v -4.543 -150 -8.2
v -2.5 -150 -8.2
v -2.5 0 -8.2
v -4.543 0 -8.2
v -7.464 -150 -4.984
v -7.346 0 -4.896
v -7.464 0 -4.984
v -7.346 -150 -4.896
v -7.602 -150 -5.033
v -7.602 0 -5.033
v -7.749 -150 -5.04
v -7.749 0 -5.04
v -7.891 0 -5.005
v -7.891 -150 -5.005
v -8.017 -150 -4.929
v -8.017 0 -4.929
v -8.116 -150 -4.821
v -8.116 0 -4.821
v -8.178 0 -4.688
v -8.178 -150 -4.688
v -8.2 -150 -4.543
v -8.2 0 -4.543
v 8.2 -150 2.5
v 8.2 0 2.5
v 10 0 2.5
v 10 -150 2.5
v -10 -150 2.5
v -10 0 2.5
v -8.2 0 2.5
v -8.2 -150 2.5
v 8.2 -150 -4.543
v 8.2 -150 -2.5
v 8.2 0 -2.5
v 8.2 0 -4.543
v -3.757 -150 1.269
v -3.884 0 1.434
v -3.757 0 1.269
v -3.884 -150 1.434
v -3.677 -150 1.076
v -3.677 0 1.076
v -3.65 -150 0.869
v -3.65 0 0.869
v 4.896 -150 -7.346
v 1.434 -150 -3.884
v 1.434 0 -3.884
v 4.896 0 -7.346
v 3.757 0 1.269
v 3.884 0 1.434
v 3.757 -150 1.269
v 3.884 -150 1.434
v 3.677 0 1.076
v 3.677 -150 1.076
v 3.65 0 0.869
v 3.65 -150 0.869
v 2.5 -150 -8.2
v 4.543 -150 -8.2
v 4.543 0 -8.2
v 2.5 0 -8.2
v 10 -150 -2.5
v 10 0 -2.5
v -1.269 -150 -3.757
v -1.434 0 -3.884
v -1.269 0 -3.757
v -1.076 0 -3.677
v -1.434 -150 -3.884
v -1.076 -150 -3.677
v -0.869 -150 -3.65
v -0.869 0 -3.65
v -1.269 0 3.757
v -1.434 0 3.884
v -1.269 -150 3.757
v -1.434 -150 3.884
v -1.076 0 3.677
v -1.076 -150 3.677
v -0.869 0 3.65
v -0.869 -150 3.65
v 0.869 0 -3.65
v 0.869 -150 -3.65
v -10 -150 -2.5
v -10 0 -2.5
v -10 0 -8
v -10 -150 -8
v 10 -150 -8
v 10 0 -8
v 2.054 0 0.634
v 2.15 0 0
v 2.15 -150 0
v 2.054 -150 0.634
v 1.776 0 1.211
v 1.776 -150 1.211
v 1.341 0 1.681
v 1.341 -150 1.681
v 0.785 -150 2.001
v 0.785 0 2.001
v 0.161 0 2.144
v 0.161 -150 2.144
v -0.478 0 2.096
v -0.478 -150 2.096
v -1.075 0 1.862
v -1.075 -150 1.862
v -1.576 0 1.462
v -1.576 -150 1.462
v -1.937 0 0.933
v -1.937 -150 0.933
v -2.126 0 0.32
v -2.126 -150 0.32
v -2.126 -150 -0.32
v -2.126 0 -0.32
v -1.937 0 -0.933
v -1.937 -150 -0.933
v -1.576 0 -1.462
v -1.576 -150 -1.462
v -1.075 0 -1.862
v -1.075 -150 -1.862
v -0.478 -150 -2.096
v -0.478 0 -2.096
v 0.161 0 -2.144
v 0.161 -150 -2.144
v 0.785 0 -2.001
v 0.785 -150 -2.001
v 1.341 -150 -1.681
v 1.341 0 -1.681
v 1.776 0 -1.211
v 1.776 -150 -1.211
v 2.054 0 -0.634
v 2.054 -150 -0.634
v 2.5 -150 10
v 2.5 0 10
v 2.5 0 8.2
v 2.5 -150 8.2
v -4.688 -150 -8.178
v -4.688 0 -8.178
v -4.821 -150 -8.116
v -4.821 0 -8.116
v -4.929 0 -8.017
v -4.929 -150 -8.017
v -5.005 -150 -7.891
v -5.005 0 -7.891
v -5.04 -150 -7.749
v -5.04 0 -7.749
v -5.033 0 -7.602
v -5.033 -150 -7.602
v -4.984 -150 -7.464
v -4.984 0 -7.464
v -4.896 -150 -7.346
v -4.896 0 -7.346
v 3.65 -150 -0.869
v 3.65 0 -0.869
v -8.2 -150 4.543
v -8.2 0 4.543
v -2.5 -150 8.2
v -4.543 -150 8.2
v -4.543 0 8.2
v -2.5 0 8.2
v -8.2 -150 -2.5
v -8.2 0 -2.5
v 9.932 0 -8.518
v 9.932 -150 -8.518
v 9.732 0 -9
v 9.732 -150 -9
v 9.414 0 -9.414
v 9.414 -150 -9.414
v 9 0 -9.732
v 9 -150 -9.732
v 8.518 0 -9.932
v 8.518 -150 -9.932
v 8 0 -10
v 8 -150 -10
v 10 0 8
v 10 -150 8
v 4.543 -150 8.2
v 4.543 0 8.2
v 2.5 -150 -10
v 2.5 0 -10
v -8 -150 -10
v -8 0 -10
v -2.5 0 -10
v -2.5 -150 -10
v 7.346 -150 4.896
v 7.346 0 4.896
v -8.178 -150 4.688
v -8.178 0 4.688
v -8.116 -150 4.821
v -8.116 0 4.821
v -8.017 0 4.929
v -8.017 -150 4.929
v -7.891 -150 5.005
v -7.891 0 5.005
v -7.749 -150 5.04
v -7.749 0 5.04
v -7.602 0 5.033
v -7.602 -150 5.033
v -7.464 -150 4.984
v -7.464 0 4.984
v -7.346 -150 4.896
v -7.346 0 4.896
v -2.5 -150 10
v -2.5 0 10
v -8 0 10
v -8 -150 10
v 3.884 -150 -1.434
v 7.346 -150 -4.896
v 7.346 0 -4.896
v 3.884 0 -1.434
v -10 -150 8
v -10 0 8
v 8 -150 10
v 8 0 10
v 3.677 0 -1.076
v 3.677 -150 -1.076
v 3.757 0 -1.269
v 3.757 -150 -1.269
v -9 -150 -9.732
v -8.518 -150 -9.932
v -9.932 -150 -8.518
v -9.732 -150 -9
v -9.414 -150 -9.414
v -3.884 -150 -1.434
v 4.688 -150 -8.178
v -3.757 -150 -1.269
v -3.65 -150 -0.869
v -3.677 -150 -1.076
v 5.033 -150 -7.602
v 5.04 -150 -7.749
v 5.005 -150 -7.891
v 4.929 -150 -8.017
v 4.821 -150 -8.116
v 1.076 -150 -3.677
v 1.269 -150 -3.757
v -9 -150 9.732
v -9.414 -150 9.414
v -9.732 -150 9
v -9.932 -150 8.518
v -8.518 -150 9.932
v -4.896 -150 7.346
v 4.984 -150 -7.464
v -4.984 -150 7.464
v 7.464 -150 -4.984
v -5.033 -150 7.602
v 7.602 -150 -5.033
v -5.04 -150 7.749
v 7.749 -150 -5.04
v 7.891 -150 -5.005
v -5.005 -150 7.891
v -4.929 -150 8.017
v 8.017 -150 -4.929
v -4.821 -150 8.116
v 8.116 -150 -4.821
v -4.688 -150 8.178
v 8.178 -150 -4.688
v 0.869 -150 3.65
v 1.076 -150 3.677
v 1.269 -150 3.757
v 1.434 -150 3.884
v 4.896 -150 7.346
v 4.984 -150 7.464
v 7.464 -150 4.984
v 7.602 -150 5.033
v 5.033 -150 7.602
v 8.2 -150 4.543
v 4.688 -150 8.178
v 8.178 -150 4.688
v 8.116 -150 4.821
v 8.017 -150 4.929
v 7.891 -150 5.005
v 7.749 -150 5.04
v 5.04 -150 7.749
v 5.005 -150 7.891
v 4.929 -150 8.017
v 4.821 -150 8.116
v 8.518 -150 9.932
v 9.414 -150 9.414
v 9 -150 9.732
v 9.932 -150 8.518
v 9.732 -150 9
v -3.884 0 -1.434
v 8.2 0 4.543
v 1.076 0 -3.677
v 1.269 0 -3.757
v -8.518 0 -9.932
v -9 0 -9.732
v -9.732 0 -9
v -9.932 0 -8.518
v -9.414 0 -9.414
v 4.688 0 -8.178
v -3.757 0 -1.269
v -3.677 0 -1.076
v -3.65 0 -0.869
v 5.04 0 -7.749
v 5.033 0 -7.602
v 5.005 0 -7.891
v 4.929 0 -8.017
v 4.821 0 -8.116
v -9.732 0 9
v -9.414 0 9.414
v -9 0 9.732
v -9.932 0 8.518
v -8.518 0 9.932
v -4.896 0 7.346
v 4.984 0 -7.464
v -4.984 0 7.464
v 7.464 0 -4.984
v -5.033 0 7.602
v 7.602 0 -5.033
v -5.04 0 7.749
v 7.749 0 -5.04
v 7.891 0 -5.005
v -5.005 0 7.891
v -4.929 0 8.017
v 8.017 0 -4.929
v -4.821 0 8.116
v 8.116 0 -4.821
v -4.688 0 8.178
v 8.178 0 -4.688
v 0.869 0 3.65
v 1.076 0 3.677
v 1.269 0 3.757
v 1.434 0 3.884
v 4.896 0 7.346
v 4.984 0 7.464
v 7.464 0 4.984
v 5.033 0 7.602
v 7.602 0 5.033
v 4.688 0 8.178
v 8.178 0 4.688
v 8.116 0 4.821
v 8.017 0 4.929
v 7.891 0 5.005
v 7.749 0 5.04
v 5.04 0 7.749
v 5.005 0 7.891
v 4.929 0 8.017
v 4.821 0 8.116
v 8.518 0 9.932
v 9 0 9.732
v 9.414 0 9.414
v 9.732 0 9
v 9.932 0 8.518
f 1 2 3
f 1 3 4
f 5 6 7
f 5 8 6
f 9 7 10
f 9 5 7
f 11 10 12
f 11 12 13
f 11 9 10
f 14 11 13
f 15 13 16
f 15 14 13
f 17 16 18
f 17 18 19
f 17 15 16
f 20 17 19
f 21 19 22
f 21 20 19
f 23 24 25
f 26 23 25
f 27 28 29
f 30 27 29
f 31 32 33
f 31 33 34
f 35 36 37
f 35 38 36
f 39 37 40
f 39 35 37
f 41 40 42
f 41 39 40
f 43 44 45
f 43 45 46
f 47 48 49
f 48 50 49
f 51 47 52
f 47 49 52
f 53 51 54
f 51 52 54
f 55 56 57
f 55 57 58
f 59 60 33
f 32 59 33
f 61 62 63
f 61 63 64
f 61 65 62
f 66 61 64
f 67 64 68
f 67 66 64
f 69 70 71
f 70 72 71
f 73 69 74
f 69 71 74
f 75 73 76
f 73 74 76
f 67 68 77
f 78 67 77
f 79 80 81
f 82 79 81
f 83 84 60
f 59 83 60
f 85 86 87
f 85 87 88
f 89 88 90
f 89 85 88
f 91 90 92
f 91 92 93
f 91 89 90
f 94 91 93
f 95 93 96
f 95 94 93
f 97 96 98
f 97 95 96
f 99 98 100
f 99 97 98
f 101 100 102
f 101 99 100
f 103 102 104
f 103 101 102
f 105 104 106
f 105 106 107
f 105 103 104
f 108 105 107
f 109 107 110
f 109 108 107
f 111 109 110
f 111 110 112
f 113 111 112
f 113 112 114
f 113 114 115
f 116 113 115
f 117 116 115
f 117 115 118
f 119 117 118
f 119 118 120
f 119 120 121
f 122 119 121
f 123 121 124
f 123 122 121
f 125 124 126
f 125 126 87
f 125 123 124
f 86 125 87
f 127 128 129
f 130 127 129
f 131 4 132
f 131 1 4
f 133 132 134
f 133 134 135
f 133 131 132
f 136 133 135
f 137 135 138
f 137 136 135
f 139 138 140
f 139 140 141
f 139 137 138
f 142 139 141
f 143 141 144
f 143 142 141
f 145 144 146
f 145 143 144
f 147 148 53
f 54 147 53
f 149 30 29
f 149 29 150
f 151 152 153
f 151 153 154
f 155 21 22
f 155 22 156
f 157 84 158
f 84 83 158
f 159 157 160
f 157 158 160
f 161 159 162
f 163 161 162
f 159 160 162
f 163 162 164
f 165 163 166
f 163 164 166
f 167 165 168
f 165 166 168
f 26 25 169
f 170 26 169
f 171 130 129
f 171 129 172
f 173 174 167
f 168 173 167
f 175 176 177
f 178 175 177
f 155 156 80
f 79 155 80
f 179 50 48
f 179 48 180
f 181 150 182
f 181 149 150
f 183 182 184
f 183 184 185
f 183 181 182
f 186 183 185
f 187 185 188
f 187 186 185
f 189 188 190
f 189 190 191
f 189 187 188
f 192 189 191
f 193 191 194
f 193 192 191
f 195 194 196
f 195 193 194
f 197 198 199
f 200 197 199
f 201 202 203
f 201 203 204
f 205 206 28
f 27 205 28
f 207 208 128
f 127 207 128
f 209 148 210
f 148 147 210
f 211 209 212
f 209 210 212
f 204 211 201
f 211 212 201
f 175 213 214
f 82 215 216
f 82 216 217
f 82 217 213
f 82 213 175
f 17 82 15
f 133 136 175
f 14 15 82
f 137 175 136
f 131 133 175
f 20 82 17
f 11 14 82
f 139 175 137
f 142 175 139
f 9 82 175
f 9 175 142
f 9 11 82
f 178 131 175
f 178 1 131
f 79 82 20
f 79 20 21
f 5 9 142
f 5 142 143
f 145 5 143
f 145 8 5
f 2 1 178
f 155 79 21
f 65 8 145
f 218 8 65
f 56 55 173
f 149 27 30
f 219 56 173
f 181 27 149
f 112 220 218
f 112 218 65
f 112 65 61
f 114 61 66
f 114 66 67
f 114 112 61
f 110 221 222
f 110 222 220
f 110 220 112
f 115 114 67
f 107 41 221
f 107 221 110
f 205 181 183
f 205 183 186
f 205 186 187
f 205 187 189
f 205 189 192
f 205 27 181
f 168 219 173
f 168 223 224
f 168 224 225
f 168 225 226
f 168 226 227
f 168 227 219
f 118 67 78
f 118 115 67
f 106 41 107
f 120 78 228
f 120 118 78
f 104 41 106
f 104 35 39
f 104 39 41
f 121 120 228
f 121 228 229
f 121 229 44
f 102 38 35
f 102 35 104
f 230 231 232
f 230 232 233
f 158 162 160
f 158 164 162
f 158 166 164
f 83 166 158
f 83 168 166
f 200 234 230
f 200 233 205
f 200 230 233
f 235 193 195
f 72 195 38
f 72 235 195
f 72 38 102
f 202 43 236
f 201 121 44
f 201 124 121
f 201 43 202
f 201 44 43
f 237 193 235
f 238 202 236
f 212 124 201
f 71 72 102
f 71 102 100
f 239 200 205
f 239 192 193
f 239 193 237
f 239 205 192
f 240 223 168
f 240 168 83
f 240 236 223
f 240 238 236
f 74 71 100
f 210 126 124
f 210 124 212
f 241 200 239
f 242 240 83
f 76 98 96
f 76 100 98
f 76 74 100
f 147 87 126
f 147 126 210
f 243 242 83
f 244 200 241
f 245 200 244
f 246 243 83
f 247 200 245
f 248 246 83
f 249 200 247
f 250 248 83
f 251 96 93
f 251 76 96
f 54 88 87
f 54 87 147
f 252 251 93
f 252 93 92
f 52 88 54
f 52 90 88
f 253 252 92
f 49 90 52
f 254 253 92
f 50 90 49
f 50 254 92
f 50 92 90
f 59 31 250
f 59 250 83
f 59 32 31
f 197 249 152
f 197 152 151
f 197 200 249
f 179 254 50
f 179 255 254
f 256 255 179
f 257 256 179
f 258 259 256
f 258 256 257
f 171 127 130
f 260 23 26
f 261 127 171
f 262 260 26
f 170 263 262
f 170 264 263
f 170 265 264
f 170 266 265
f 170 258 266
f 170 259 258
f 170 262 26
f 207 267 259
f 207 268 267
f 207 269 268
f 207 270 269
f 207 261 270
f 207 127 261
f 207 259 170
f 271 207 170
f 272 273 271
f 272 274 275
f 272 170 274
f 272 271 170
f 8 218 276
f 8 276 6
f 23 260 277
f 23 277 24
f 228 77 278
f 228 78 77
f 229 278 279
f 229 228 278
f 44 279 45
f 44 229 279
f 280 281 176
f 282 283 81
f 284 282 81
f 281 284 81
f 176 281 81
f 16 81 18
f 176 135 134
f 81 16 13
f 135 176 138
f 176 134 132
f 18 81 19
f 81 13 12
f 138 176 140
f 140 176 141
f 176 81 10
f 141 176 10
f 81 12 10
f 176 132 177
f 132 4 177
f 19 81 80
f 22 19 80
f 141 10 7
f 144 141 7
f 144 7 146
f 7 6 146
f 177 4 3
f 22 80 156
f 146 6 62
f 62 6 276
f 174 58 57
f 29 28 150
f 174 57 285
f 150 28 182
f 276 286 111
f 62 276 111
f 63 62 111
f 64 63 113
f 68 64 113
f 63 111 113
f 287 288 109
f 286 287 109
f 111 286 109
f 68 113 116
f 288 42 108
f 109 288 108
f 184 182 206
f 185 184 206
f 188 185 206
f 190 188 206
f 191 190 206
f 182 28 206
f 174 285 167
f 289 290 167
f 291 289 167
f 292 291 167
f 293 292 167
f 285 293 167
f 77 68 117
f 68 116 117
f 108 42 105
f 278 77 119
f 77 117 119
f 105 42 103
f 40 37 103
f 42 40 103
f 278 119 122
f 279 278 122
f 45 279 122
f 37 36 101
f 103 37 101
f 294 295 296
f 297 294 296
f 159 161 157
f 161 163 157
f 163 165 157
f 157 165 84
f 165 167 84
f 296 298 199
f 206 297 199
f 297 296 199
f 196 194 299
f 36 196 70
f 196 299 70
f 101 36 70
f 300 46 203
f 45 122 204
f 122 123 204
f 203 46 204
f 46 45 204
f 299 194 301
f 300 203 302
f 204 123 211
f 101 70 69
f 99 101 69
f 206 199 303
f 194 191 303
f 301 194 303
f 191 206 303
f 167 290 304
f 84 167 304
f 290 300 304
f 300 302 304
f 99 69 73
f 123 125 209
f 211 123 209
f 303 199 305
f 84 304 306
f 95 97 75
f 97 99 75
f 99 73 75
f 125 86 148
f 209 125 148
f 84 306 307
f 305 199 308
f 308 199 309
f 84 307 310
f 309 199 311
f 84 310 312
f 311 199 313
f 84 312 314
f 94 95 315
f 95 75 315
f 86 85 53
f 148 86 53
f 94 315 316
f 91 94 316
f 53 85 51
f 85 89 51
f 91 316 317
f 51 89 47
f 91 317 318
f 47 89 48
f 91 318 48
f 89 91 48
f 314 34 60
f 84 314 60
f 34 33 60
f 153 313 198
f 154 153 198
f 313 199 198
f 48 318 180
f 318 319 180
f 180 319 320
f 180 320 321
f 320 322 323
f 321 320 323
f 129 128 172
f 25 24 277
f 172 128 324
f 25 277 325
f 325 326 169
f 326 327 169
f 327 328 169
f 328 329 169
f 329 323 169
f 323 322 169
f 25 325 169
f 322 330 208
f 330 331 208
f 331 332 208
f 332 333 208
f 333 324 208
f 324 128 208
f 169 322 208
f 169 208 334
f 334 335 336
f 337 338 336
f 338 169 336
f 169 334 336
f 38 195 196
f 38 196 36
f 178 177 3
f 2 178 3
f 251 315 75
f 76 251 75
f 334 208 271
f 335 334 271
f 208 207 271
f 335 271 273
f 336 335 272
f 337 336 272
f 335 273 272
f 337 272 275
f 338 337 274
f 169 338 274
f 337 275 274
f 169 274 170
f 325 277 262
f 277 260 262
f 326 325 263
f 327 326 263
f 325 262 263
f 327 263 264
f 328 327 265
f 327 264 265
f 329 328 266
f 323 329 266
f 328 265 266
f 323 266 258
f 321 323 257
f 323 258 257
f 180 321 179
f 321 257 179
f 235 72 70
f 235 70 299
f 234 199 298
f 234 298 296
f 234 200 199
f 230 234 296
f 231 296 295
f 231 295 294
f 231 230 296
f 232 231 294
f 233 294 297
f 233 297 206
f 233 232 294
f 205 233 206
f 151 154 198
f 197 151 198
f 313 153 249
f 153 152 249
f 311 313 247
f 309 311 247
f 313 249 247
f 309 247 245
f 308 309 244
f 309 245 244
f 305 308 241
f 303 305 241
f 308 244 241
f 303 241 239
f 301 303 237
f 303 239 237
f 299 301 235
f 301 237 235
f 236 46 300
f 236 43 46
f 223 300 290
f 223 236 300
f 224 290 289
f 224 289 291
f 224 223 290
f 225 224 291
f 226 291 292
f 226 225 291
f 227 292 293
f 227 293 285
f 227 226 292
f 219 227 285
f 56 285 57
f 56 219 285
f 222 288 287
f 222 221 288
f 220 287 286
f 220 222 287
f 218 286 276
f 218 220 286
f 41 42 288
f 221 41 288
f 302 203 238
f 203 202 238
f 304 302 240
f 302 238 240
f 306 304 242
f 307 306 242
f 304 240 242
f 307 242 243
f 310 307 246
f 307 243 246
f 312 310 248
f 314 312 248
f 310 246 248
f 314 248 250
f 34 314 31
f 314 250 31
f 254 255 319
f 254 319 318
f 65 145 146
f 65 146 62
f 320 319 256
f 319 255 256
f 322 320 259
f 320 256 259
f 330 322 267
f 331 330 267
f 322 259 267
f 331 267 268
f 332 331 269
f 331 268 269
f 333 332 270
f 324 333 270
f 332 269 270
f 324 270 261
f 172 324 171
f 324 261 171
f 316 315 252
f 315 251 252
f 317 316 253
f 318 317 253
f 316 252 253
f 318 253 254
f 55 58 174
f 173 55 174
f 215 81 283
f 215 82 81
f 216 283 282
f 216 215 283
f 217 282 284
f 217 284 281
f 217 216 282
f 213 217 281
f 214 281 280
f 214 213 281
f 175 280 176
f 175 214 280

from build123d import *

# Parameters (mm, degrees)
F0_R     = 2.15
F1_DEPTH = 150
F2_R     = 2
F3_R     = 0.5
F4_R     = 0.8


with BuildPart() as f1:
    # F0 (on Front) → F1 (new body)
    with BuildSketch(Plane.XZ):
        Polygon((-2.5, 10), (-10, 10), (-10, 2.5), (-8.2, 2.5), (-8.2, 5.75), (-3.65, 1.2), (-3.65, 0), (-3.65, -1.2), (-8.2, -5.75), (-8.2, -2.5), (-10, -2.5), (-10, -10), (-2.5, -10), (-2.5, -8.2), (-5.75, -8.2), (-1.2, -3.65), (0, -3.65), (1.2, -3.65), (5.75, -8.2), (2.5, -8.2), (2.5, -10), (10, -10), (10, -2.5), (8.2, -2.5), (8.2, -5.75), (3.65, -1.2), (3.65, 0), (3.65, 1.2), (8.2, 5.75), (8.2, 2.5), (10, 2.5), (10, 10), (2.5, 10), (2.5, 8.2), (5.75, 8.2), (1.2, 3.65), (0, 3.65), (-1.2, 3.65), (-5.75, 8.2), (-2.5, 8.2), align=None)
        Circle(F0_R, mode=Mode.SUBTRACT)
    extrude(amount=F1_DEPTH)

    # F2
    f2_edges = [f1.edges().sort_by_distance(p)[0] for p in [
        (-10, -75, 10),
        (10, -75, 10),
        (10, -75, -10),
        (-10, -75, -10),
    ]]
    fillet(f2_edges, radius=F2_R)

    # F3
    f3_edges = [f1.edges().sort_by_distance(p)[0] for p in [
        (-8.2, -75, -5.75),
        (8.2, -75, -5.75),
        (5.75, -75, 8.2),
        (5.75, -75, -8.2),
        (-5.75, -75, 8.2),
        (-5.75, -75, -8.2),
        (8.2, -75, 5.75),
        (-8.2, -75, 5.75),
    ]]
    fillet(f3_edges, radius=F3_R)

    # F4
    f4_edges = [f1.edges().sort_by_distance(p)[0] for p in [
        (-1.2, -75, 3.65),
        (3.65, -75, -1.2),
        (1.2, -75, 3.65),
        (-3.65, -75, 1.2),
        (-3.65, -75, -1.2),
        (1.2, -75, -3.65),
        (-1.2, -75, -3.65),
        (3.65, -75, 1.2),
    ]]
    fillet(f4_edges, radius=F4_R)


solid = f1.part
